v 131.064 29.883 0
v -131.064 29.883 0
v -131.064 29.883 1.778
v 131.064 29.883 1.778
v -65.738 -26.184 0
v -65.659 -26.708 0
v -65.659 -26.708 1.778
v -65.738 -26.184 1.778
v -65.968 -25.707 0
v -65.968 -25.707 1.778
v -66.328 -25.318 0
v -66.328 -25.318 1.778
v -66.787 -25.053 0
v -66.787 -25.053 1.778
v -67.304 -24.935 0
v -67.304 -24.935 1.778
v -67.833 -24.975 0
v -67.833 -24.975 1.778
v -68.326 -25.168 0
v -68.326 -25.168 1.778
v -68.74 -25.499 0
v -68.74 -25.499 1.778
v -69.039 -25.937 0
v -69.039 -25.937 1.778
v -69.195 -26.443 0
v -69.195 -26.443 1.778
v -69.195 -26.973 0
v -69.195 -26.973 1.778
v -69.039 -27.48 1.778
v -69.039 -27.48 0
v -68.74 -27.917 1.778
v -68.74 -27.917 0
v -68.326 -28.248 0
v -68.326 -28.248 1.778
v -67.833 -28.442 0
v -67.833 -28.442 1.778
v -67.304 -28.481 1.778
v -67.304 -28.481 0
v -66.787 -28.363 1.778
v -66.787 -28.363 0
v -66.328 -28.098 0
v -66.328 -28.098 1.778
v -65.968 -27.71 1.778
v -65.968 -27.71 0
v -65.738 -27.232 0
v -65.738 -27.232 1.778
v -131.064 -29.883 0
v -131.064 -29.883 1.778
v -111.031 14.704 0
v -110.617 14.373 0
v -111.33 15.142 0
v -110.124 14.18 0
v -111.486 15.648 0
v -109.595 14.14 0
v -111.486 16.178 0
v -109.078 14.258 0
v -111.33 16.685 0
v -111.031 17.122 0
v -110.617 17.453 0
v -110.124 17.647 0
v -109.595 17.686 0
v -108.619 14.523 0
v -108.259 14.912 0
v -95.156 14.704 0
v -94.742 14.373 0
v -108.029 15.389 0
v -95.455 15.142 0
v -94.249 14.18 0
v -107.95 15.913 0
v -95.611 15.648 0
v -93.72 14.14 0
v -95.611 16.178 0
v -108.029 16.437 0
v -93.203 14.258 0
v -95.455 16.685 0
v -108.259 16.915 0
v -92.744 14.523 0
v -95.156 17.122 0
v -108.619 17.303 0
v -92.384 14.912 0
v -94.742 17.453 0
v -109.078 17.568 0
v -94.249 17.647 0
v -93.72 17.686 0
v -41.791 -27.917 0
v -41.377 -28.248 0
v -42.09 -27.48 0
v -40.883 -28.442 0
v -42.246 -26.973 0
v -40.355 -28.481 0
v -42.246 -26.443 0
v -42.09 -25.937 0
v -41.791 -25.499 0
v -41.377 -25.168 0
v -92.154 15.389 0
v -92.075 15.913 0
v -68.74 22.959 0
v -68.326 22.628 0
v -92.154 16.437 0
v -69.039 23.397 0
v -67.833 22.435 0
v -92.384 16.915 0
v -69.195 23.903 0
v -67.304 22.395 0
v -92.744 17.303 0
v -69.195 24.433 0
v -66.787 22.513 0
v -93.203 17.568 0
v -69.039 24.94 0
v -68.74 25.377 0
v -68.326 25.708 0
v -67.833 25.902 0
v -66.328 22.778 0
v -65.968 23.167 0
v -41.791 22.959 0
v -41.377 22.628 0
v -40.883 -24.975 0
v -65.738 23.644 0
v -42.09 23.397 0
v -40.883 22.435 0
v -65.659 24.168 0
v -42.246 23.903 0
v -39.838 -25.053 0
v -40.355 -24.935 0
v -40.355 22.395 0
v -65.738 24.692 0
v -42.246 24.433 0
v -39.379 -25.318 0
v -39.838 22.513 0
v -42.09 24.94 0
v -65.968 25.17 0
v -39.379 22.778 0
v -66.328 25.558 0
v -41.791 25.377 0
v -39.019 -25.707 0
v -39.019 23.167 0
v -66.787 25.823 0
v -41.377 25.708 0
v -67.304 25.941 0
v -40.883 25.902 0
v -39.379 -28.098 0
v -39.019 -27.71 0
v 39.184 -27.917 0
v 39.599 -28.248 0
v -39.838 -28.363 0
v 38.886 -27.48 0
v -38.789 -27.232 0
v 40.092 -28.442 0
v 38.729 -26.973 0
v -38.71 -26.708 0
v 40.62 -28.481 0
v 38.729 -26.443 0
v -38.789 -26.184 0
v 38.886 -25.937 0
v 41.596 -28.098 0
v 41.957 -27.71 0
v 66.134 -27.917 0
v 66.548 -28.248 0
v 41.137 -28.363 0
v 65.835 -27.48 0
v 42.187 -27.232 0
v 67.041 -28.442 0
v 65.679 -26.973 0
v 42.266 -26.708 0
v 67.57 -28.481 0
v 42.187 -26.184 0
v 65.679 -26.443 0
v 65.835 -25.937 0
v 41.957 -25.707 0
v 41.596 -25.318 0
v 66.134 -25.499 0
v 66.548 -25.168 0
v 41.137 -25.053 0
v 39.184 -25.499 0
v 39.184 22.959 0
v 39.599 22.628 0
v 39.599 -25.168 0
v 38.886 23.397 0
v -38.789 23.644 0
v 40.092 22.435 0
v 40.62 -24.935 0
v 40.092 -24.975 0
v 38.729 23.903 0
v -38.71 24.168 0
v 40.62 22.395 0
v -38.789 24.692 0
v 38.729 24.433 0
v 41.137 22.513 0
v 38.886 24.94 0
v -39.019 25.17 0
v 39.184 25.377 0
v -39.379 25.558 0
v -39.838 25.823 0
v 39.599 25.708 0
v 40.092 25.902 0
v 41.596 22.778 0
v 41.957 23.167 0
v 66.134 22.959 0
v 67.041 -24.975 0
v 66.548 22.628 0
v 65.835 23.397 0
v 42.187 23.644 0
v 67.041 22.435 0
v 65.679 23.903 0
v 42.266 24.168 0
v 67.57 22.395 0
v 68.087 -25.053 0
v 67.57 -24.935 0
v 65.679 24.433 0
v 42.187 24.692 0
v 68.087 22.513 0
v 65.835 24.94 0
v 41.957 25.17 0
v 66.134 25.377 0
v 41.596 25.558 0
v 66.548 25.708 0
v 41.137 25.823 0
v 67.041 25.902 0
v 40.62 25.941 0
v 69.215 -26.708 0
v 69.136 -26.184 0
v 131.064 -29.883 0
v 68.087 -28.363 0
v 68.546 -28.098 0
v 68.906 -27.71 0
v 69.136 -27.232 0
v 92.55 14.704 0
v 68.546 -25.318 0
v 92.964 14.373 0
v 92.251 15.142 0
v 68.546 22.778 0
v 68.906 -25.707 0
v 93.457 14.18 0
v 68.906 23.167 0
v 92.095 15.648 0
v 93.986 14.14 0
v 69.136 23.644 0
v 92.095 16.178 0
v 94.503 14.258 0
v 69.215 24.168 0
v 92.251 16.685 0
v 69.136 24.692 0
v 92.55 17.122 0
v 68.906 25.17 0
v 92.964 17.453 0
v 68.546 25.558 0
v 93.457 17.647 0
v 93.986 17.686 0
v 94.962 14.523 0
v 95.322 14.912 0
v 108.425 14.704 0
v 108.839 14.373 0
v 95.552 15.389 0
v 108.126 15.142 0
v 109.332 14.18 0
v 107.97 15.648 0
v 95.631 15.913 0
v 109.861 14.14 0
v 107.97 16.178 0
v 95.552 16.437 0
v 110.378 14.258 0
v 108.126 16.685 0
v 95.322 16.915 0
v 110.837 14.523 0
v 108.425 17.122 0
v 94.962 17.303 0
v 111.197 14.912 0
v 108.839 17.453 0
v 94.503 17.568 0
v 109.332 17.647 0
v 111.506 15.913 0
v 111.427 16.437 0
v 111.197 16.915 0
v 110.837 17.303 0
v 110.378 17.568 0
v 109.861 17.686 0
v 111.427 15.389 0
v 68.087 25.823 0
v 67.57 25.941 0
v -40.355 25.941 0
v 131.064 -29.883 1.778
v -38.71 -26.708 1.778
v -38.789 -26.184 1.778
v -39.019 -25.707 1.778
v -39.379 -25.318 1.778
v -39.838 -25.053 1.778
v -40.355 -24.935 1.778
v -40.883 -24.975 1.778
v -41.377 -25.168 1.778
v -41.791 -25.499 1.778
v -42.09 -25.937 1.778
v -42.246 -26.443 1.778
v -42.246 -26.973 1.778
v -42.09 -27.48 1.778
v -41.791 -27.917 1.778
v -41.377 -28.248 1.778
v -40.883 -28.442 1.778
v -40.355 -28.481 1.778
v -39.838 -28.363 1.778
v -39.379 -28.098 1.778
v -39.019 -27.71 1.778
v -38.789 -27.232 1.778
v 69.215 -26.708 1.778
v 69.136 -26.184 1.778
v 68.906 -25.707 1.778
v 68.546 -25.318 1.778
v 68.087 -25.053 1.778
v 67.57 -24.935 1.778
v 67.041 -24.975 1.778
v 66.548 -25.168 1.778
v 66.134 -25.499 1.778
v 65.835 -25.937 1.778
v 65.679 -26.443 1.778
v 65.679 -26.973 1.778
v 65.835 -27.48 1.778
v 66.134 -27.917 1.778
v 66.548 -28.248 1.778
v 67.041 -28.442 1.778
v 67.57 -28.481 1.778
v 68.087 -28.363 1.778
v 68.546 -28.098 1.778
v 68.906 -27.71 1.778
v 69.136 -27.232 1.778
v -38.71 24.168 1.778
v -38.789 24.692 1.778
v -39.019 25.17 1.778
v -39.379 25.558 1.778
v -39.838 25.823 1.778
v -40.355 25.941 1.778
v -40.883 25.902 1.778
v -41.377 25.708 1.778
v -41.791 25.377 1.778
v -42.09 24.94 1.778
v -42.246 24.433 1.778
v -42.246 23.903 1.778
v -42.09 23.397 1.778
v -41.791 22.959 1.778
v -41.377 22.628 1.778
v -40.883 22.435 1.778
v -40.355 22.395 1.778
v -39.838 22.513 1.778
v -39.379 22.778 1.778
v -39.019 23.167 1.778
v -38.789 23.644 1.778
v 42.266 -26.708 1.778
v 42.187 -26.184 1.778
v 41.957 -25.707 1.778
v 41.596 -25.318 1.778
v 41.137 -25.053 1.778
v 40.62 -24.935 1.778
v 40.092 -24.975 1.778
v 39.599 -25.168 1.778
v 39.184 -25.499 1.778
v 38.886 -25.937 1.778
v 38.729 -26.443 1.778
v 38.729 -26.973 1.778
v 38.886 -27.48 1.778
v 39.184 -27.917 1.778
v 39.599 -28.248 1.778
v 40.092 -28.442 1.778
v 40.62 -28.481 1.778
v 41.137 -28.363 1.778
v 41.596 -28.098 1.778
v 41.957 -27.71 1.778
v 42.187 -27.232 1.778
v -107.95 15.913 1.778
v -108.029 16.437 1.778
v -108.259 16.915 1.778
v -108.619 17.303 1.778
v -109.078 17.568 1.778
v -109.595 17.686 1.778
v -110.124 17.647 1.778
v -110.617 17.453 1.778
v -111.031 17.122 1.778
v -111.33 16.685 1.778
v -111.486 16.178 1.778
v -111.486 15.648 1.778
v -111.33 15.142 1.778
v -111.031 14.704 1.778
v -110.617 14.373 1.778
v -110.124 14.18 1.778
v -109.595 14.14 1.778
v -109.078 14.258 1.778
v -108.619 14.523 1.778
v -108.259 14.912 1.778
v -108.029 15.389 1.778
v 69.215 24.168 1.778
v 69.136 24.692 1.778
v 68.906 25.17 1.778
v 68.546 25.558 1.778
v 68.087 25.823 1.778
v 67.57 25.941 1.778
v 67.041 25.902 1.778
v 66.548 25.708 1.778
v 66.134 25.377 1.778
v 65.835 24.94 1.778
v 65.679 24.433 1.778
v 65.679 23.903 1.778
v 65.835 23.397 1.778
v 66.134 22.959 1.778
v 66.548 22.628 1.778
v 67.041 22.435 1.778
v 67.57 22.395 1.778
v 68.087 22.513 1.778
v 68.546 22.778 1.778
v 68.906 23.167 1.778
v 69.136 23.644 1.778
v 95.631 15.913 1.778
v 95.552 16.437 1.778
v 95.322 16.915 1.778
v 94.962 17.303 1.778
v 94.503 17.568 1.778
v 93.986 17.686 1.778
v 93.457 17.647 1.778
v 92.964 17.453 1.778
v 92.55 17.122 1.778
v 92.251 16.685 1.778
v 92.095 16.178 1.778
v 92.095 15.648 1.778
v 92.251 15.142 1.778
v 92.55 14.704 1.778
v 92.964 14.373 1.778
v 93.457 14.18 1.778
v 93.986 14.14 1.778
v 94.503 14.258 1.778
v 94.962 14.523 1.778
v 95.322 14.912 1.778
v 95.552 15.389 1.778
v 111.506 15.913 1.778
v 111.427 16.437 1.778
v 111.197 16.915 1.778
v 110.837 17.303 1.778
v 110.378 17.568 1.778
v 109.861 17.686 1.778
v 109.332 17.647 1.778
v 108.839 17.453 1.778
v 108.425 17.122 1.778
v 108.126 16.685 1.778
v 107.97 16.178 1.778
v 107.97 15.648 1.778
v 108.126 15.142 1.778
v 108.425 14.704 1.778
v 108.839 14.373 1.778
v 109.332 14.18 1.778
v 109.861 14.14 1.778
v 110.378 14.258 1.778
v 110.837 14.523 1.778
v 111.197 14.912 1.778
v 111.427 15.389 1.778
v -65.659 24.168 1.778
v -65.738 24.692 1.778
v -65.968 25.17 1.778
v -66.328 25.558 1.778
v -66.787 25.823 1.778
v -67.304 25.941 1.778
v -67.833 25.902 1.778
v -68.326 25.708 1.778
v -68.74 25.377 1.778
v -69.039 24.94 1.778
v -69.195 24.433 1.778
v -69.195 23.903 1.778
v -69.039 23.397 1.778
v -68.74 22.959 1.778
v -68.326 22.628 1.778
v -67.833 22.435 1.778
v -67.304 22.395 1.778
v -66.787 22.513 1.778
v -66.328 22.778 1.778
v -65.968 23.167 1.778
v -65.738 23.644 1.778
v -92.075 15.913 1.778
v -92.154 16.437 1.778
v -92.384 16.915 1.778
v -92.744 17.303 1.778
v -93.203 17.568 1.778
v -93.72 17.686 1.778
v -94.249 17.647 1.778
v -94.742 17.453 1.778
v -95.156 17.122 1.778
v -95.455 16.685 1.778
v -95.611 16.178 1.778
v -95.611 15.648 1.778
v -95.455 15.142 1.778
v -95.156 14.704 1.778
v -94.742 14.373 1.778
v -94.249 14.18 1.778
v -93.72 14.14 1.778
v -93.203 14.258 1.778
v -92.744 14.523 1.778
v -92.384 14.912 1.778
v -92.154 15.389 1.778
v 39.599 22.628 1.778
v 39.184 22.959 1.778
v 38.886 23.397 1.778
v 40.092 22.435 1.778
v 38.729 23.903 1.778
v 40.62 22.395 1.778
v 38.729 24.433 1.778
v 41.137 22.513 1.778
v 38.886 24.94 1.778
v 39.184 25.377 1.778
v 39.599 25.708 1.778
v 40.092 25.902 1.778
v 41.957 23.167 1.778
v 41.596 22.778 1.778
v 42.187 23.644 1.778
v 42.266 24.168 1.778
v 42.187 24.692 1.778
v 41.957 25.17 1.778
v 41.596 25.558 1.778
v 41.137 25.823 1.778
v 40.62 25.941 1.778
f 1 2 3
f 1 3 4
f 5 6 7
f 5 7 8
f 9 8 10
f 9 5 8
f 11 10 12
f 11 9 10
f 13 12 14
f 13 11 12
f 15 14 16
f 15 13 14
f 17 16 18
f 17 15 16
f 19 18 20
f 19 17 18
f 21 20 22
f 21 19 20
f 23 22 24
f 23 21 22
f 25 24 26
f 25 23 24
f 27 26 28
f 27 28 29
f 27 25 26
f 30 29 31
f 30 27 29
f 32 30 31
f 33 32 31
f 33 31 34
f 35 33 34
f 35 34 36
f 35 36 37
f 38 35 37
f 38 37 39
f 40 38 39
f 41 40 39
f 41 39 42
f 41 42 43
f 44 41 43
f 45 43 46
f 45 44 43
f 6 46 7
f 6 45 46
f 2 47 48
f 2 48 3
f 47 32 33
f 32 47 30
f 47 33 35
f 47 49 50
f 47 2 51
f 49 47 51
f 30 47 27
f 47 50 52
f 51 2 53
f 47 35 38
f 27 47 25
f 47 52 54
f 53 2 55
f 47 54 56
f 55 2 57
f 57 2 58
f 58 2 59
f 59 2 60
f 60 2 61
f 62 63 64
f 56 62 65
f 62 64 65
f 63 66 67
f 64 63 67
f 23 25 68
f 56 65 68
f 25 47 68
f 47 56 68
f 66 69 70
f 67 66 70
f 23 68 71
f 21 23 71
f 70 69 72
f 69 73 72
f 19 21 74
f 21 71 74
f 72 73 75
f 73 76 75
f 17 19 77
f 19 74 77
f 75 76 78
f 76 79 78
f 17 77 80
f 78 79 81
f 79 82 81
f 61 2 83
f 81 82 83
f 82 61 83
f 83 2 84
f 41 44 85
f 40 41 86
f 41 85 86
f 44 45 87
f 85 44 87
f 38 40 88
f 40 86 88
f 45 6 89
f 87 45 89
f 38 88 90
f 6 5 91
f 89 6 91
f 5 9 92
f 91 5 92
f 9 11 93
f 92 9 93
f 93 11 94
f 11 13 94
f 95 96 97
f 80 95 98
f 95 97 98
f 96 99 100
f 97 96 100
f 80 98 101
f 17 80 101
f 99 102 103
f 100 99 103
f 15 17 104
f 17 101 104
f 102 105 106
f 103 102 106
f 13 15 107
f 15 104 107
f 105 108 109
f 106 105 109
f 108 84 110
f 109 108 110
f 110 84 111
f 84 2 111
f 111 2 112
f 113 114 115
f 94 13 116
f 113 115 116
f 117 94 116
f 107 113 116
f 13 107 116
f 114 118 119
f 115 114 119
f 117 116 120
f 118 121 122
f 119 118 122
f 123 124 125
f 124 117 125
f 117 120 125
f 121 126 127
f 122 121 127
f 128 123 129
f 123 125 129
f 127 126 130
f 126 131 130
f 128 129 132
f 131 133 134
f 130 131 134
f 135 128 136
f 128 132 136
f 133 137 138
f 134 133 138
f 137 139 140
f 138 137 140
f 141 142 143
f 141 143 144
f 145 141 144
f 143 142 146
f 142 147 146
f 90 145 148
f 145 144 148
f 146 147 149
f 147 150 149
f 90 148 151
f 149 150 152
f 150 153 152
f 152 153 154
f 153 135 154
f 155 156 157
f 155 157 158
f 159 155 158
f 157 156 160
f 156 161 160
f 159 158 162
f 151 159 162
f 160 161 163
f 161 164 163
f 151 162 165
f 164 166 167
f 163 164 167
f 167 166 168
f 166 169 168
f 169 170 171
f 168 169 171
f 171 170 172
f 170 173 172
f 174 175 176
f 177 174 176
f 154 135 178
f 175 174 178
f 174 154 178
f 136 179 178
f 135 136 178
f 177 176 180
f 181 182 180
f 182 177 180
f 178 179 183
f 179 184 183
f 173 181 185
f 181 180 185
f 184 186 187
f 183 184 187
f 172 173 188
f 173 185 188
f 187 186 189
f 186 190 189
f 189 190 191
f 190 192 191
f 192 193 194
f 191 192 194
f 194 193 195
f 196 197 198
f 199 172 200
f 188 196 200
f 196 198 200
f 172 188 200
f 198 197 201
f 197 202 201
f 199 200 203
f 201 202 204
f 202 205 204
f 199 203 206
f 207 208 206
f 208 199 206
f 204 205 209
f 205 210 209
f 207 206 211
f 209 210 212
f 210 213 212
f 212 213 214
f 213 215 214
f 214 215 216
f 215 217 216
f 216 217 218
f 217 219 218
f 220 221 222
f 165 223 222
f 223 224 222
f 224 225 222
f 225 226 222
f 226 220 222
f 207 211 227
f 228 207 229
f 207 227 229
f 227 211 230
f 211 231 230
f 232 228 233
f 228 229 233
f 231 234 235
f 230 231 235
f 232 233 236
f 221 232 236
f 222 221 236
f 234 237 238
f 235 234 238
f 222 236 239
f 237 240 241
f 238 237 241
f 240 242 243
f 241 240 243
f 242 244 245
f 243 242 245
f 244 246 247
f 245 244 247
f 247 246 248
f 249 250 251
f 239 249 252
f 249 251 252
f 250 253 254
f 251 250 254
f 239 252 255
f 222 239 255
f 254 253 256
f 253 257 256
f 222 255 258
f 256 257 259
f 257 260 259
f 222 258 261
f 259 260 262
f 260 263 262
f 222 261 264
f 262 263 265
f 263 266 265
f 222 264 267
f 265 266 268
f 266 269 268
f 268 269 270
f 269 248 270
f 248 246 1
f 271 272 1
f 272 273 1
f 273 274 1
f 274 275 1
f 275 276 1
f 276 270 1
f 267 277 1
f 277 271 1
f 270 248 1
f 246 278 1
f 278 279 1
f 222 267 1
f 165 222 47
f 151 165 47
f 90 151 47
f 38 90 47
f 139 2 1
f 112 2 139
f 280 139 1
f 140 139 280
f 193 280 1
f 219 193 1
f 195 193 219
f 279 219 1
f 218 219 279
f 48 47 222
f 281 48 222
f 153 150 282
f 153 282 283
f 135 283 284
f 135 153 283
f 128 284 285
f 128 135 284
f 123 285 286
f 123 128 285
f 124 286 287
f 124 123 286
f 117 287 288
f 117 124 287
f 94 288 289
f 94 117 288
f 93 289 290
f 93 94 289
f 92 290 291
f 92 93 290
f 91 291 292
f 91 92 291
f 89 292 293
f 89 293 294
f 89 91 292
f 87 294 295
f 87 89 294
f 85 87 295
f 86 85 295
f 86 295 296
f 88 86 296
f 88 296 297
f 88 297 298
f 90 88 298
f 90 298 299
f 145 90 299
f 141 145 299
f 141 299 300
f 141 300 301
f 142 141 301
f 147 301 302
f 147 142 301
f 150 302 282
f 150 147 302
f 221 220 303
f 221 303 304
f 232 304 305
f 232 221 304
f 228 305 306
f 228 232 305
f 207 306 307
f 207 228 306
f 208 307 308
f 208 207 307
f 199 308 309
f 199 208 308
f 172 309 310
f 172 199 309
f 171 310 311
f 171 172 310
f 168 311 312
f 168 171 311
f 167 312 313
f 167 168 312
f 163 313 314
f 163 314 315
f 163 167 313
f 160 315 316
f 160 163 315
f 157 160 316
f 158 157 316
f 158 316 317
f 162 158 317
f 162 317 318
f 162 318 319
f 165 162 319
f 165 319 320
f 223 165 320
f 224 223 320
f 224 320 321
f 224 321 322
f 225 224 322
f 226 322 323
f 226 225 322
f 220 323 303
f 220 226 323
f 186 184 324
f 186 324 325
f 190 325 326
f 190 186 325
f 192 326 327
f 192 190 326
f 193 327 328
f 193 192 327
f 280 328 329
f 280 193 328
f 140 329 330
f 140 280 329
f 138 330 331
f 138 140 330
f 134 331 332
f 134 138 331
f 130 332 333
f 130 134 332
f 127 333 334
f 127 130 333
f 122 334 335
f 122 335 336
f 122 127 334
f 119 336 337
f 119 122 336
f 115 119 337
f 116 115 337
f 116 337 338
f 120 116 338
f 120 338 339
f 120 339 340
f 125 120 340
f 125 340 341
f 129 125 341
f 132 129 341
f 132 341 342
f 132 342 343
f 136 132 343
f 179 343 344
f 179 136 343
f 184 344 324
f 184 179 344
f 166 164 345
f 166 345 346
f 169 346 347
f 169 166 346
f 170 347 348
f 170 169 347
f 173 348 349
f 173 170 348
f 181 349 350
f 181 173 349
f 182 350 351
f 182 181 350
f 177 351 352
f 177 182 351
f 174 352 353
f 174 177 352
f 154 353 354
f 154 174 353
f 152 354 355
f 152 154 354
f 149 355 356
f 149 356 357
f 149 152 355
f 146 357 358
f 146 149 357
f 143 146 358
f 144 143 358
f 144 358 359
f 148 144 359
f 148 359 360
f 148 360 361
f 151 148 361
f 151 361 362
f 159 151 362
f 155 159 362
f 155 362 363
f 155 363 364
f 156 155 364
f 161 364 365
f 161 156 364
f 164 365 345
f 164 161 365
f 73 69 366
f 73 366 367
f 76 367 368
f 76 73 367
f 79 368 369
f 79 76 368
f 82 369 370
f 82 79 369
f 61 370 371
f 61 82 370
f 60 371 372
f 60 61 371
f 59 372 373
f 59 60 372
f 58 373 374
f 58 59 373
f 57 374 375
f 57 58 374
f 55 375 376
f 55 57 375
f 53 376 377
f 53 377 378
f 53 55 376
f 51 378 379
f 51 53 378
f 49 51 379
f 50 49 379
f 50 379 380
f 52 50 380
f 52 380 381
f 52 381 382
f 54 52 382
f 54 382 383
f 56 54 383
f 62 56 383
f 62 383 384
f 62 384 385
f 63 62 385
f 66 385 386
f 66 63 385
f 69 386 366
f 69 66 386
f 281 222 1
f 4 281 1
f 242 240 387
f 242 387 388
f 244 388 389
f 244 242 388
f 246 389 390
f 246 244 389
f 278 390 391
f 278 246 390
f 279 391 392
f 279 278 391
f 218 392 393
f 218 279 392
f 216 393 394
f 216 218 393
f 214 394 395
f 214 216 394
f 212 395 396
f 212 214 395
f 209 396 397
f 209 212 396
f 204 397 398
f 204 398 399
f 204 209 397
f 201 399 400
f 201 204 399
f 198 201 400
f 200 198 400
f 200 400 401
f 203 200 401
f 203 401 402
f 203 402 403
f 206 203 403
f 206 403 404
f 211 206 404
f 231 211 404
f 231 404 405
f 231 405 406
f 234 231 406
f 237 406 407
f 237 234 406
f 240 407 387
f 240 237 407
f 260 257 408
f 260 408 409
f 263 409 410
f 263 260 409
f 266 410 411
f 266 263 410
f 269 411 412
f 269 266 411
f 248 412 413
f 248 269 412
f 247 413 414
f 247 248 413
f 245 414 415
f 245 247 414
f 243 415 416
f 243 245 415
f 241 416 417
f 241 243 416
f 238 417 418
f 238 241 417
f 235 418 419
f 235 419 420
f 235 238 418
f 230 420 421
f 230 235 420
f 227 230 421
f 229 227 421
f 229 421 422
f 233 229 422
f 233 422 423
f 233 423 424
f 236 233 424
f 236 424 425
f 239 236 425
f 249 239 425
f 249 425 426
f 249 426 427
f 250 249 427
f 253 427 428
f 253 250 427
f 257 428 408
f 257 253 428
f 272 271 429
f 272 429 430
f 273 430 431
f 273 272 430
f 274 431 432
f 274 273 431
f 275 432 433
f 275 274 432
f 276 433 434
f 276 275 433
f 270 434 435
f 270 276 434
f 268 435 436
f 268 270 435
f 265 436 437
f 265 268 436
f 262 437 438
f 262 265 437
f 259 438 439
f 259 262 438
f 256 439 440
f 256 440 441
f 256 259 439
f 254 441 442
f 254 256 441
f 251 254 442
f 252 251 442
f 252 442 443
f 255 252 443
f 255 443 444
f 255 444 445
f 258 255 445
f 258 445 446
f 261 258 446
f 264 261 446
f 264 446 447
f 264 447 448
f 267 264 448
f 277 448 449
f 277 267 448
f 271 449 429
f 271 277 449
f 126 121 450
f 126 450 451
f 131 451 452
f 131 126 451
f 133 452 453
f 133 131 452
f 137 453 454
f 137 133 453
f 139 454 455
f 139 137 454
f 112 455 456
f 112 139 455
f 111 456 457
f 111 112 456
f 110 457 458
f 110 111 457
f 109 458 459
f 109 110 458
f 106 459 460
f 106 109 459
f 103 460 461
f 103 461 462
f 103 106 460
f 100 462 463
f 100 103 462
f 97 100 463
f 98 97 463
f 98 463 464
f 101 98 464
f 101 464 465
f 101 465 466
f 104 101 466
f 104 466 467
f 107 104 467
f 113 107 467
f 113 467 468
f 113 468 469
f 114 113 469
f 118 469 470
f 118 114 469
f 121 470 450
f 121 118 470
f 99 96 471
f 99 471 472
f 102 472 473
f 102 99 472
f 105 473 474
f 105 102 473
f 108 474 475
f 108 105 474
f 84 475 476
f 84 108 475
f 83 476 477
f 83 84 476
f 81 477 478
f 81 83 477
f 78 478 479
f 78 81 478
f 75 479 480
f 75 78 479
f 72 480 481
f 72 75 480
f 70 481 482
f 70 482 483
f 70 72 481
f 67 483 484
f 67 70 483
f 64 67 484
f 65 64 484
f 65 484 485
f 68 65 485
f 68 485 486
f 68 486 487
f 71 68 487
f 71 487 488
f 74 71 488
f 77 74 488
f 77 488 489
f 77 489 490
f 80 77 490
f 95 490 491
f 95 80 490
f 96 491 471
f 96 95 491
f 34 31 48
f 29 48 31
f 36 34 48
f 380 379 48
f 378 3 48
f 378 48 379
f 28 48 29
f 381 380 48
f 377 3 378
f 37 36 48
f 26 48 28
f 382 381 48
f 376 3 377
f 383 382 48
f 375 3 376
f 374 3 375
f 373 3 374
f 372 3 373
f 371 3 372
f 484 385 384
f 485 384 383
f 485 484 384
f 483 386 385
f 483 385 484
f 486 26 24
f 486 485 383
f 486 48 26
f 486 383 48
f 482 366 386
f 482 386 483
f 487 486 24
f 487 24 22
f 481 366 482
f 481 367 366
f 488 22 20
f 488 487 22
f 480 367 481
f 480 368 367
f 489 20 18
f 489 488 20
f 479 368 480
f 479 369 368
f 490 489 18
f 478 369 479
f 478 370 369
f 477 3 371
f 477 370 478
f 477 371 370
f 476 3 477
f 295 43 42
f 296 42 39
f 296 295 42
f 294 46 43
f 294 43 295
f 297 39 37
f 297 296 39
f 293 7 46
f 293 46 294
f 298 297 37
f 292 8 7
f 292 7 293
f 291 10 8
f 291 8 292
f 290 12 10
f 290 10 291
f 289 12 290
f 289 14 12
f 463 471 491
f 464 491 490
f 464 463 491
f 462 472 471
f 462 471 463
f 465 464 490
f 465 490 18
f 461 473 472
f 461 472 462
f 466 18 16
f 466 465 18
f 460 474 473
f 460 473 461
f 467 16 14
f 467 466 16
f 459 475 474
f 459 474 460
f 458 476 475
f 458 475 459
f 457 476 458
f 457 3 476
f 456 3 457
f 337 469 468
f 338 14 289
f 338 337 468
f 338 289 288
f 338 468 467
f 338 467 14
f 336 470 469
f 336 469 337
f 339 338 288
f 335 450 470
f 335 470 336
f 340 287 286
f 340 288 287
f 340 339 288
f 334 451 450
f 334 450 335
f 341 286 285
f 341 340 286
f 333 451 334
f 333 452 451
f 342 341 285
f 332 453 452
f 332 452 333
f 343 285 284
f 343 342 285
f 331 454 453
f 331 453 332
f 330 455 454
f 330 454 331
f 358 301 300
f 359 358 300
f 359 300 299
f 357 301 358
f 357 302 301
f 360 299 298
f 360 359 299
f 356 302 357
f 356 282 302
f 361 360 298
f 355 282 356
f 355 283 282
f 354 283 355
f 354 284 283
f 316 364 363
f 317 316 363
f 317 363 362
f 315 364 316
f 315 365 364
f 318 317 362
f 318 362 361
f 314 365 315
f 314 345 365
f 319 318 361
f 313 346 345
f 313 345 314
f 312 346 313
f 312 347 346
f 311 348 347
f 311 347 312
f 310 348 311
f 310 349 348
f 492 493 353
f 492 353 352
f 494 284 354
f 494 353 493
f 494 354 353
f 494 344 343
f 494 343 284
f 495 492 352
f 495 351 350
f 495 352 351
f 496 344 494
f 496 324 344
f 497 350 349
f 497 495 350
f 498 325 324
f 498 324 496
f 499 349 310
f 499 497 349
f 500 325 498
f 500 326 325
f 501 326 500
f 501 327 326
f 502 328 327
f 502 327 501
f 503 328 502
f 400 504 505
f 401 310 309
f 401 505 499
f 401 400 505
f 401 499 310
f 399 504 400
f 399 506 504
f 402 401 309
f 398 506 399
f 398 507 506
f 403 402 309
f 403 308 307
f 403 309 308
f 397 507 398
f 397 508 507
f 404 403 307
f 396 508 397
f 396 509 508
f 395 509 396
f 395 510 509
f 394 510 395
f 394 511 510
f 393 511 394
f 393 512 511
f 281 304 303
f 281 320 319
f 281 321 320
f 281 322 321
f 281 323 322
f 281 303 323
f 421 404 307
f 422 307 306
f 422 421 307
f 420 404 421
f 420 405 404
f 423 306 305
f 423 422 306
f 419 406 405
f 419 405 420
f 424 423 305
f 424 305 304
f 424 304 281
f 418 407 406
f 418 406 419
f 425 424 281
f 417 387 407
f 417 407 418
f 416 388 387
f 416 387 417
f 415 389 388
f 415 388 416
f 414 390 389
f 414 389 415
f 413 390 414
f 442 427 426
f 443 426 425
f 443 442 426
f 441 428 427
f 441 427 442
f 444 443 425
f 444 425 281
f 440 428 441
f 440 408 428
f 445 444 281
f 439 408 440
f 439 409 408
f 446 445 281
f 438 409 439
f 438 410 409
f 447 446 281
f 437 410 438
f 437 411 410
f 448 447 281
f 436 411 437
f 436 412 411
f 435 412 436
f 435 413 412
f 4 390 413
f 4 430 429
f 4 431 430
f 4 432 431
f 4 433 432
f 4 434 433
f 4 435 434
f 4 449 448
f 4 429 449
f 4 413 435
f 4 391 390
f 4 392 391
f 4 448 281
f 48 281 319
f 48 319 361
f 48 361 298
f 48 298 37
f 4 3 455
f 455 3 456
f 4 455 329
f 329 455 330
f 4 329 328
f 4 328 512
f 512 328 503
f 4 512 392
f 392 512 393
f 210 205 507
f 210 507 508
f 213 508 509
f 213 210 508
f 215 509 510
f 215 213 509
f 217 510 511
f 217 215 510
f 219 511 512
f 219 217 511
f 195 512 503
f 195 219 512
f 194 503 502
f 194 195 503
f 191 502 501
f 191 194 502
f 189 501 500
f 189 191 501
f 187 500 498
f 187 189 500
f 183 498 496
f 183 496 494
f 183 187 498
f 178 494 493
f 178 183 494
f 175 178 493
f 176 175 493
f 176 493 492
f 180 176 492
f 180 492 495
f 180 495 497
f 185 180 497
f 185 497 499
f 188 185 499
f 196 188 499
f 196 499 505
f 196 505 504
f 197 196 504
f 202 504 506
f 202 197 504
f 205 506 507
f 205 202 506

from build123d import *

# Parameters (mm, degrees)
F0_W     = 262.128
F0_H     = 59.7662
F0_R     = 1.778
F1_DEPTH = 1.778


with BuildPart() as f1:
    # F0 (on Top) → F1 (new body)
    with BuildSketch(Plane.XY):
        Rectangle(F0_W, F0_H)
        with Locations((-67.437, -26.7081)):
            Circle(F0_R, mode=Mode.SUBTRACT)
        with Locations((-40.4876, -26.7081)):
            Circle(F0_R, mode=Mode.SUBTRACT)
        with Locations((40.4876, -26.7081)):
            Circle(F0_R, mode=Mode.SUBTRACT)
        with Locations((67.437, -26.7081)):
            Circle(F0_R, mode=Mode.SUBTRACT)
        with Locations((-109.728, 15.9131)):
            Circle(F0_R, mode=Mode.SUBTRACT)
        with Locations((-93.853, 15.9131)):
            Circle(F0_R, mode=Mode.SUBTRACT)
        with Locations((-67.437, 24.1681)):
            Circle(F0_R, mode=Mode.SUBTRACT)
        with Locations((-40.4876, 24.1681)):
            Circle(F0_R, mode=Mode.SUBTRACT)
        with Locations((40.4876, 24.1681)):
            Circle(F0_R, mode=Mode.SUBTRACT)
        with Locations((93.853, 15.9131)):
            Circle(F0_R, mode=Mode.SUBTRACT)
        with Locations((109.728, 15.9131)):
            Circle(F0_R, mode=Mode.SUBTRACT)
        with Locations((67.437, 24.1681)):
            Circle(F0_R, mode=Mode.SUBTRACT)
    extrude(amount=F1_DEPTH)


solid = f1.part
